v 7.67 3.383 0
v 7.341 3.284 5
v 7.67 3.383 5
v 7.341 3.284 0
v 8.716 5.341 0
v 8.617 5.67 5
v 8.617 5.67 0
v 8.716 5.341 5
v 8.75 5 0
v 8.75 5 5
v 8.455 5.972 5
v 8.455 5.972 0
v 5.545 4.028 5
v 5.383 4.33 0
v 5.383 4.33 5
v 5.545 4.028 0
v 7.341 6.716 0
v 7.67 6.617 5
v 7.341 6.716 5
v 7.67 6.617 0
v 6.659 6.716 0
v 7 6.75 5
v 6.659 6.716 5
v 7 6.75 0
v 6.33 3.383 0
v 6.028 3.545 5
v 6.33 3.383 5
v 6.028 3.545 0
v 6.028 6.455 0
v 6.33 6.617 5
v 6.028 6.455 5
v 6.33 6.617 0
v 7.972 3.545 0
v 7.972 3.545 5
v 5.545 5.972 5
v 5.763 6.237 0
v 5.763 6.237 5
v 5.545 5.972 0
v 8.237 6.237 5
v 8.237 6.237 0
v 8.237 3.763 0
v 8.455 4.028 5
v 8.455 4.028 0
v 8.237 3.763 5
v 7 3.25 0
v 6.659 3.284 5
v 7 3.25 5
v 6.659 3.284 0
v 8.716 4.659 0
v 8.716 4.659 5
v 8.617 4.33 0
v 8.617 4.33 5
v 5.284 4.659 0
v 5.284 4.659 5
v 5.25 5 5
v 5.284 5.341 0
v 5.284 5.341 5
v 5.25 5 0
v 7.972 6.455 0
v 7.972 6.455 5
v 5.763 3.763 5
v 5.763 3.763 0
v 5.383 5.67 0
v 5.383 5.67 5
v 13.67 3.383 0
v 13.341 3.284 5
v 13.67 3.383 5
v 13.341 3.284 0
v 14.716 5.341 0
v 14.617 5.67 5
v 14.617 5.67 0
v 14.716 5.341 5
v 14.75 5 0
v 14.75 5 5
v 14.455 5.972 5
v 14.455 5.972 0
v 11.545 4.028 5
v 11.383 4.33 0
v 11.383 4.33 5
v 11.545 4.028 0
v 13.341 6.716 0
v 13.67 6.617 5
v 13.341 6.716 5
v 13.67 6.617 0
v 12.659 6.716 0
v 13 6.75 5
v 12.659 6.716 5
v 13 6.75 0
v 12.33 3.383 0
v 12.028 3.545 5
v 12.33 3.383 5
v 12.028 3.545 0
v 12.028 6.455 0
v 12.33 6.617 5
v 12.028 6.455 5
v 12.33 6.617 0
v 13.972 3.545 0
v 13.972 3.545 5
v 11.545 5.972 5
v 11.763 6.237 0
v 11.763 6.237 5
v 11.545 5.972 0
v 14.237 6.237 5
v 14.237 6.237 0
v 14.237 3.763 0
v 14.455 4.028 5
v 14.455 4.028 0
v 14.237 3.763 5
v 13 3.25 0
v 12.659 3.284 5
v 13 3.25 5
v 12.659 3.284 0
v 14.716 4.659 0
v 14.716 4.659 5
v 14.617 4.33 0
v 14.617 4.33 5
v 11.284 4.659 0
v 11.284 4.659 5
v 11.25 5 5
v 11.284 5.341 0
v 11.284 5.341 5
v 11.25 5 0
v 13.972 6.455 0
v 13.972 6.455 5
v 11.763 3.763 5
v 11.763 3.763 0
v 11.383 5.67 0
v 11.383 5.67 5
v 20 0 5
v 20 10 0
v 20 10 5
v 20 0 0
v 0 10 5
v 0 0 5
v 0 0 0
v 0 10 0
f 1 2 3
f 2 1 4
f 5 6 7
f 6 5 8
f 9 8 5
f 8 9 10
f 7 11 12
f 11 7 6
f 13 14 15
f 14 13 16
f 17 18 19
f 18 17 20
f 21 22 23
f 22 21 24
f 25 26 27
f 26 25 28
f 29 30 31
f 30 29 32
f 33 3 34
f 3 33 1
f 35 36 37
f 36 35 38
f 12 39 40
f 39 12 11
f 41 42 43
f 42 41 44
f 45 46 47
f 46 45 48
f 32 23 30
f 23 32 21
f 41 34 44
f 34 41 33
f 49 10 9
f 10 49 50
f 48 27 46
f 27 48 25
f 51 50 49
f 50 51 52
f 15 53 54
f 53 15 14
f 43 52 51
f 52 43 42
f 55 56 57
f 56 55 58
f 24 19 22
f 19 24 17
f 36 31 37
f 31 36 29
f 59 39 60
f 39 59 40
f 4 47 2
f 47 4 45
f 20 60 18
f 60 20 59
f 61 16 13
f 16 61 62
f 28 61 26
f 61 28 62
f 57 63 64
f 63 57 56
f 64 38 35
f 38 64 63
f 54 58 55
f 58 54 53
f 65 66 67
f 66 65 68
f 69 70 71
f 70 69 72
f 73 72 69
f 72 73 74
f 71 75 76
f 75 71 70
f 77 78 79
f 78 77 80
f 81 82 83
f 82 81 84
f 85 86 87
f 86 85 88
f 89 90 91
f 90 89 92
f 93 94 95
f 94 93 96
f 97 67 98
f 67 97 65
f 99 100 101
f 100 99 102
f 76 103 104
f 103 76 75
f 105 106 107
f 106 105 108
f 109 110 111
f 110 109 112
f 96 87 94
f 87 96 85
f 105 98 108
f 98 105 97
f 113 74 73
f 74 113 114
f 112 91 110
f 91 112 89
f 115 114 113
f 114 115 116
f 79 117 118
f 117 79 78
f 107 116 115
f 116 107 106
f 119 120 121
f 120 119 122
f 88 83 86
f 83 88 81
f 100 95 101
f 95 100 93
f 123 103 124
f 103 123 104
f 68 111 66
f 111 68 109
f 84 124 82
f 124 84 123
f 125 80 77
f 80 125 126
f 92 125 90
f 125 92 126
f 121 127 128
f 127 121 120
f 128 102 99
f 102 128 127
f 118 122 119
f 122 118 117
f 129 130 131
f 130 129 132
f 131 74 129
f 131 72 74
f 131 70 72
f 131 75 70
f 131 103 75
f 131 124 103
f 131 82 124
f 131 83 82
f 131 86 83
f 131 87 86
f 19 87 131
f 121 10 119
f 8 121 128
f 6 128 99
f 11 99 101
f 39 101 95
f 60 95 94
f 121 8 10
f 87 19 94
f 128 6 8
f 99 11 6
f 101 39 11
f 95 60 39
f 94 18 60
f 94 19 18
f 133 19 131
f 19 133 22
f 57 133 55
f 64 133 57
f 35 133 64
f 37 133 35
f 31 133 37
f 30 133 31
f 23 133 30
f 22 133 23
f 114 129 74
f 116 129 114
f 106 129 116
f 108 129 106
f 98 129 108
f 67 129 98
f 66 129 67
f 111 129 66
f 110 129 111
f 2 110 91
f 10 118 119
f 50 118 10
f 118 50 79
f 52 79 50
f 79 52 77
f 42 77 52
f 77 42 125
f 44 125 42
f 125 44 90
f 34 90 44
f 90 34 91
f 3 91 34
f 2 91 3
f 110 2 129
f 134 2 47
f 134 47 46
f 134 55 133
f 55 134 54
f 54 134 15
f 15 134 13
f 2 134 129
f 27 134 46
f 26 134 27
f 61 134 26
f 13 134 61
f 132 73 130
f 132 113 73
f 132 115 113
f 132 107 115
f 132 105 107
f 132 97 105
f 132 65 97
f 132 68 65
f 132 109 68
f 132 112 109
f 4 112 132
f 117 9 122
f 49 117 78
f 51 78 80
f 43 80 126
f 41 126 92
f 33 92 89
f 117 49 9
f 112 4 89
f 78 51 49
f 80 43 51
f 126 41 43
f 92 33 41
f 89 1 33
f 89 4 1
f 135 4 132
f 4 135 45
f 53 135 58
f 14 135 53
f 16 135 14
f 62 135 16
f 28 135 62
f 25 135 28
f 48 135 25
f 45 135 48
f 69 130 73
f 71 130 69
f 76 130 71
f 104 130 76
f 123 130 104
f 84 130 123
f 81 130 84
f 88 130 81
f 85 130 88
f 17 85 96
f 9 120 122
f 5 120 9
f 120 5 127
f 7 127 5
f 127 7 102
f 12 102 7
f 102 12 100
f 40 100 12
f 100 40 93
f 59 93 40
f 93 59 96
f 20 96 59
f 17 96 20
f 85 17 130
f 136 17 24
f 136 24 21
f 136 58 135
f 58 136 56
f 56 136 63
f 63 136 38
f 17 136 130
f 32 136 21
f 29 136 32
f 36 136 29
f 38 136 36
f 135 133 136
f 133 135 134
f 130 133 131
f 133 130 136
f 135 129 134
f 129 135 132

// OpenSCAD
$fn = 32;

// ----------------------------------------------------------------------
// Micro pad: two-hole pad, 5-20 mm class
// ----------------------------------------------------------------------

// --- parameters (mm) ---
pad_l = 20;               // pad length, X
pad_w = 10;               // pad width, Y
pad_t = 5;                // pad thickness, Z
hole_d = 3.5;             // hole diameter
hole_x = 7;               // X of the first hole centre

difference() {
  cube([pad_l, pad_w, pad_t]);
  for (x = [hole_x, pad_l - hole_x])
    translate([x, pad_w / 2, -1])
      cylinder(h = pad_t + 2, d = hole_d);
}
